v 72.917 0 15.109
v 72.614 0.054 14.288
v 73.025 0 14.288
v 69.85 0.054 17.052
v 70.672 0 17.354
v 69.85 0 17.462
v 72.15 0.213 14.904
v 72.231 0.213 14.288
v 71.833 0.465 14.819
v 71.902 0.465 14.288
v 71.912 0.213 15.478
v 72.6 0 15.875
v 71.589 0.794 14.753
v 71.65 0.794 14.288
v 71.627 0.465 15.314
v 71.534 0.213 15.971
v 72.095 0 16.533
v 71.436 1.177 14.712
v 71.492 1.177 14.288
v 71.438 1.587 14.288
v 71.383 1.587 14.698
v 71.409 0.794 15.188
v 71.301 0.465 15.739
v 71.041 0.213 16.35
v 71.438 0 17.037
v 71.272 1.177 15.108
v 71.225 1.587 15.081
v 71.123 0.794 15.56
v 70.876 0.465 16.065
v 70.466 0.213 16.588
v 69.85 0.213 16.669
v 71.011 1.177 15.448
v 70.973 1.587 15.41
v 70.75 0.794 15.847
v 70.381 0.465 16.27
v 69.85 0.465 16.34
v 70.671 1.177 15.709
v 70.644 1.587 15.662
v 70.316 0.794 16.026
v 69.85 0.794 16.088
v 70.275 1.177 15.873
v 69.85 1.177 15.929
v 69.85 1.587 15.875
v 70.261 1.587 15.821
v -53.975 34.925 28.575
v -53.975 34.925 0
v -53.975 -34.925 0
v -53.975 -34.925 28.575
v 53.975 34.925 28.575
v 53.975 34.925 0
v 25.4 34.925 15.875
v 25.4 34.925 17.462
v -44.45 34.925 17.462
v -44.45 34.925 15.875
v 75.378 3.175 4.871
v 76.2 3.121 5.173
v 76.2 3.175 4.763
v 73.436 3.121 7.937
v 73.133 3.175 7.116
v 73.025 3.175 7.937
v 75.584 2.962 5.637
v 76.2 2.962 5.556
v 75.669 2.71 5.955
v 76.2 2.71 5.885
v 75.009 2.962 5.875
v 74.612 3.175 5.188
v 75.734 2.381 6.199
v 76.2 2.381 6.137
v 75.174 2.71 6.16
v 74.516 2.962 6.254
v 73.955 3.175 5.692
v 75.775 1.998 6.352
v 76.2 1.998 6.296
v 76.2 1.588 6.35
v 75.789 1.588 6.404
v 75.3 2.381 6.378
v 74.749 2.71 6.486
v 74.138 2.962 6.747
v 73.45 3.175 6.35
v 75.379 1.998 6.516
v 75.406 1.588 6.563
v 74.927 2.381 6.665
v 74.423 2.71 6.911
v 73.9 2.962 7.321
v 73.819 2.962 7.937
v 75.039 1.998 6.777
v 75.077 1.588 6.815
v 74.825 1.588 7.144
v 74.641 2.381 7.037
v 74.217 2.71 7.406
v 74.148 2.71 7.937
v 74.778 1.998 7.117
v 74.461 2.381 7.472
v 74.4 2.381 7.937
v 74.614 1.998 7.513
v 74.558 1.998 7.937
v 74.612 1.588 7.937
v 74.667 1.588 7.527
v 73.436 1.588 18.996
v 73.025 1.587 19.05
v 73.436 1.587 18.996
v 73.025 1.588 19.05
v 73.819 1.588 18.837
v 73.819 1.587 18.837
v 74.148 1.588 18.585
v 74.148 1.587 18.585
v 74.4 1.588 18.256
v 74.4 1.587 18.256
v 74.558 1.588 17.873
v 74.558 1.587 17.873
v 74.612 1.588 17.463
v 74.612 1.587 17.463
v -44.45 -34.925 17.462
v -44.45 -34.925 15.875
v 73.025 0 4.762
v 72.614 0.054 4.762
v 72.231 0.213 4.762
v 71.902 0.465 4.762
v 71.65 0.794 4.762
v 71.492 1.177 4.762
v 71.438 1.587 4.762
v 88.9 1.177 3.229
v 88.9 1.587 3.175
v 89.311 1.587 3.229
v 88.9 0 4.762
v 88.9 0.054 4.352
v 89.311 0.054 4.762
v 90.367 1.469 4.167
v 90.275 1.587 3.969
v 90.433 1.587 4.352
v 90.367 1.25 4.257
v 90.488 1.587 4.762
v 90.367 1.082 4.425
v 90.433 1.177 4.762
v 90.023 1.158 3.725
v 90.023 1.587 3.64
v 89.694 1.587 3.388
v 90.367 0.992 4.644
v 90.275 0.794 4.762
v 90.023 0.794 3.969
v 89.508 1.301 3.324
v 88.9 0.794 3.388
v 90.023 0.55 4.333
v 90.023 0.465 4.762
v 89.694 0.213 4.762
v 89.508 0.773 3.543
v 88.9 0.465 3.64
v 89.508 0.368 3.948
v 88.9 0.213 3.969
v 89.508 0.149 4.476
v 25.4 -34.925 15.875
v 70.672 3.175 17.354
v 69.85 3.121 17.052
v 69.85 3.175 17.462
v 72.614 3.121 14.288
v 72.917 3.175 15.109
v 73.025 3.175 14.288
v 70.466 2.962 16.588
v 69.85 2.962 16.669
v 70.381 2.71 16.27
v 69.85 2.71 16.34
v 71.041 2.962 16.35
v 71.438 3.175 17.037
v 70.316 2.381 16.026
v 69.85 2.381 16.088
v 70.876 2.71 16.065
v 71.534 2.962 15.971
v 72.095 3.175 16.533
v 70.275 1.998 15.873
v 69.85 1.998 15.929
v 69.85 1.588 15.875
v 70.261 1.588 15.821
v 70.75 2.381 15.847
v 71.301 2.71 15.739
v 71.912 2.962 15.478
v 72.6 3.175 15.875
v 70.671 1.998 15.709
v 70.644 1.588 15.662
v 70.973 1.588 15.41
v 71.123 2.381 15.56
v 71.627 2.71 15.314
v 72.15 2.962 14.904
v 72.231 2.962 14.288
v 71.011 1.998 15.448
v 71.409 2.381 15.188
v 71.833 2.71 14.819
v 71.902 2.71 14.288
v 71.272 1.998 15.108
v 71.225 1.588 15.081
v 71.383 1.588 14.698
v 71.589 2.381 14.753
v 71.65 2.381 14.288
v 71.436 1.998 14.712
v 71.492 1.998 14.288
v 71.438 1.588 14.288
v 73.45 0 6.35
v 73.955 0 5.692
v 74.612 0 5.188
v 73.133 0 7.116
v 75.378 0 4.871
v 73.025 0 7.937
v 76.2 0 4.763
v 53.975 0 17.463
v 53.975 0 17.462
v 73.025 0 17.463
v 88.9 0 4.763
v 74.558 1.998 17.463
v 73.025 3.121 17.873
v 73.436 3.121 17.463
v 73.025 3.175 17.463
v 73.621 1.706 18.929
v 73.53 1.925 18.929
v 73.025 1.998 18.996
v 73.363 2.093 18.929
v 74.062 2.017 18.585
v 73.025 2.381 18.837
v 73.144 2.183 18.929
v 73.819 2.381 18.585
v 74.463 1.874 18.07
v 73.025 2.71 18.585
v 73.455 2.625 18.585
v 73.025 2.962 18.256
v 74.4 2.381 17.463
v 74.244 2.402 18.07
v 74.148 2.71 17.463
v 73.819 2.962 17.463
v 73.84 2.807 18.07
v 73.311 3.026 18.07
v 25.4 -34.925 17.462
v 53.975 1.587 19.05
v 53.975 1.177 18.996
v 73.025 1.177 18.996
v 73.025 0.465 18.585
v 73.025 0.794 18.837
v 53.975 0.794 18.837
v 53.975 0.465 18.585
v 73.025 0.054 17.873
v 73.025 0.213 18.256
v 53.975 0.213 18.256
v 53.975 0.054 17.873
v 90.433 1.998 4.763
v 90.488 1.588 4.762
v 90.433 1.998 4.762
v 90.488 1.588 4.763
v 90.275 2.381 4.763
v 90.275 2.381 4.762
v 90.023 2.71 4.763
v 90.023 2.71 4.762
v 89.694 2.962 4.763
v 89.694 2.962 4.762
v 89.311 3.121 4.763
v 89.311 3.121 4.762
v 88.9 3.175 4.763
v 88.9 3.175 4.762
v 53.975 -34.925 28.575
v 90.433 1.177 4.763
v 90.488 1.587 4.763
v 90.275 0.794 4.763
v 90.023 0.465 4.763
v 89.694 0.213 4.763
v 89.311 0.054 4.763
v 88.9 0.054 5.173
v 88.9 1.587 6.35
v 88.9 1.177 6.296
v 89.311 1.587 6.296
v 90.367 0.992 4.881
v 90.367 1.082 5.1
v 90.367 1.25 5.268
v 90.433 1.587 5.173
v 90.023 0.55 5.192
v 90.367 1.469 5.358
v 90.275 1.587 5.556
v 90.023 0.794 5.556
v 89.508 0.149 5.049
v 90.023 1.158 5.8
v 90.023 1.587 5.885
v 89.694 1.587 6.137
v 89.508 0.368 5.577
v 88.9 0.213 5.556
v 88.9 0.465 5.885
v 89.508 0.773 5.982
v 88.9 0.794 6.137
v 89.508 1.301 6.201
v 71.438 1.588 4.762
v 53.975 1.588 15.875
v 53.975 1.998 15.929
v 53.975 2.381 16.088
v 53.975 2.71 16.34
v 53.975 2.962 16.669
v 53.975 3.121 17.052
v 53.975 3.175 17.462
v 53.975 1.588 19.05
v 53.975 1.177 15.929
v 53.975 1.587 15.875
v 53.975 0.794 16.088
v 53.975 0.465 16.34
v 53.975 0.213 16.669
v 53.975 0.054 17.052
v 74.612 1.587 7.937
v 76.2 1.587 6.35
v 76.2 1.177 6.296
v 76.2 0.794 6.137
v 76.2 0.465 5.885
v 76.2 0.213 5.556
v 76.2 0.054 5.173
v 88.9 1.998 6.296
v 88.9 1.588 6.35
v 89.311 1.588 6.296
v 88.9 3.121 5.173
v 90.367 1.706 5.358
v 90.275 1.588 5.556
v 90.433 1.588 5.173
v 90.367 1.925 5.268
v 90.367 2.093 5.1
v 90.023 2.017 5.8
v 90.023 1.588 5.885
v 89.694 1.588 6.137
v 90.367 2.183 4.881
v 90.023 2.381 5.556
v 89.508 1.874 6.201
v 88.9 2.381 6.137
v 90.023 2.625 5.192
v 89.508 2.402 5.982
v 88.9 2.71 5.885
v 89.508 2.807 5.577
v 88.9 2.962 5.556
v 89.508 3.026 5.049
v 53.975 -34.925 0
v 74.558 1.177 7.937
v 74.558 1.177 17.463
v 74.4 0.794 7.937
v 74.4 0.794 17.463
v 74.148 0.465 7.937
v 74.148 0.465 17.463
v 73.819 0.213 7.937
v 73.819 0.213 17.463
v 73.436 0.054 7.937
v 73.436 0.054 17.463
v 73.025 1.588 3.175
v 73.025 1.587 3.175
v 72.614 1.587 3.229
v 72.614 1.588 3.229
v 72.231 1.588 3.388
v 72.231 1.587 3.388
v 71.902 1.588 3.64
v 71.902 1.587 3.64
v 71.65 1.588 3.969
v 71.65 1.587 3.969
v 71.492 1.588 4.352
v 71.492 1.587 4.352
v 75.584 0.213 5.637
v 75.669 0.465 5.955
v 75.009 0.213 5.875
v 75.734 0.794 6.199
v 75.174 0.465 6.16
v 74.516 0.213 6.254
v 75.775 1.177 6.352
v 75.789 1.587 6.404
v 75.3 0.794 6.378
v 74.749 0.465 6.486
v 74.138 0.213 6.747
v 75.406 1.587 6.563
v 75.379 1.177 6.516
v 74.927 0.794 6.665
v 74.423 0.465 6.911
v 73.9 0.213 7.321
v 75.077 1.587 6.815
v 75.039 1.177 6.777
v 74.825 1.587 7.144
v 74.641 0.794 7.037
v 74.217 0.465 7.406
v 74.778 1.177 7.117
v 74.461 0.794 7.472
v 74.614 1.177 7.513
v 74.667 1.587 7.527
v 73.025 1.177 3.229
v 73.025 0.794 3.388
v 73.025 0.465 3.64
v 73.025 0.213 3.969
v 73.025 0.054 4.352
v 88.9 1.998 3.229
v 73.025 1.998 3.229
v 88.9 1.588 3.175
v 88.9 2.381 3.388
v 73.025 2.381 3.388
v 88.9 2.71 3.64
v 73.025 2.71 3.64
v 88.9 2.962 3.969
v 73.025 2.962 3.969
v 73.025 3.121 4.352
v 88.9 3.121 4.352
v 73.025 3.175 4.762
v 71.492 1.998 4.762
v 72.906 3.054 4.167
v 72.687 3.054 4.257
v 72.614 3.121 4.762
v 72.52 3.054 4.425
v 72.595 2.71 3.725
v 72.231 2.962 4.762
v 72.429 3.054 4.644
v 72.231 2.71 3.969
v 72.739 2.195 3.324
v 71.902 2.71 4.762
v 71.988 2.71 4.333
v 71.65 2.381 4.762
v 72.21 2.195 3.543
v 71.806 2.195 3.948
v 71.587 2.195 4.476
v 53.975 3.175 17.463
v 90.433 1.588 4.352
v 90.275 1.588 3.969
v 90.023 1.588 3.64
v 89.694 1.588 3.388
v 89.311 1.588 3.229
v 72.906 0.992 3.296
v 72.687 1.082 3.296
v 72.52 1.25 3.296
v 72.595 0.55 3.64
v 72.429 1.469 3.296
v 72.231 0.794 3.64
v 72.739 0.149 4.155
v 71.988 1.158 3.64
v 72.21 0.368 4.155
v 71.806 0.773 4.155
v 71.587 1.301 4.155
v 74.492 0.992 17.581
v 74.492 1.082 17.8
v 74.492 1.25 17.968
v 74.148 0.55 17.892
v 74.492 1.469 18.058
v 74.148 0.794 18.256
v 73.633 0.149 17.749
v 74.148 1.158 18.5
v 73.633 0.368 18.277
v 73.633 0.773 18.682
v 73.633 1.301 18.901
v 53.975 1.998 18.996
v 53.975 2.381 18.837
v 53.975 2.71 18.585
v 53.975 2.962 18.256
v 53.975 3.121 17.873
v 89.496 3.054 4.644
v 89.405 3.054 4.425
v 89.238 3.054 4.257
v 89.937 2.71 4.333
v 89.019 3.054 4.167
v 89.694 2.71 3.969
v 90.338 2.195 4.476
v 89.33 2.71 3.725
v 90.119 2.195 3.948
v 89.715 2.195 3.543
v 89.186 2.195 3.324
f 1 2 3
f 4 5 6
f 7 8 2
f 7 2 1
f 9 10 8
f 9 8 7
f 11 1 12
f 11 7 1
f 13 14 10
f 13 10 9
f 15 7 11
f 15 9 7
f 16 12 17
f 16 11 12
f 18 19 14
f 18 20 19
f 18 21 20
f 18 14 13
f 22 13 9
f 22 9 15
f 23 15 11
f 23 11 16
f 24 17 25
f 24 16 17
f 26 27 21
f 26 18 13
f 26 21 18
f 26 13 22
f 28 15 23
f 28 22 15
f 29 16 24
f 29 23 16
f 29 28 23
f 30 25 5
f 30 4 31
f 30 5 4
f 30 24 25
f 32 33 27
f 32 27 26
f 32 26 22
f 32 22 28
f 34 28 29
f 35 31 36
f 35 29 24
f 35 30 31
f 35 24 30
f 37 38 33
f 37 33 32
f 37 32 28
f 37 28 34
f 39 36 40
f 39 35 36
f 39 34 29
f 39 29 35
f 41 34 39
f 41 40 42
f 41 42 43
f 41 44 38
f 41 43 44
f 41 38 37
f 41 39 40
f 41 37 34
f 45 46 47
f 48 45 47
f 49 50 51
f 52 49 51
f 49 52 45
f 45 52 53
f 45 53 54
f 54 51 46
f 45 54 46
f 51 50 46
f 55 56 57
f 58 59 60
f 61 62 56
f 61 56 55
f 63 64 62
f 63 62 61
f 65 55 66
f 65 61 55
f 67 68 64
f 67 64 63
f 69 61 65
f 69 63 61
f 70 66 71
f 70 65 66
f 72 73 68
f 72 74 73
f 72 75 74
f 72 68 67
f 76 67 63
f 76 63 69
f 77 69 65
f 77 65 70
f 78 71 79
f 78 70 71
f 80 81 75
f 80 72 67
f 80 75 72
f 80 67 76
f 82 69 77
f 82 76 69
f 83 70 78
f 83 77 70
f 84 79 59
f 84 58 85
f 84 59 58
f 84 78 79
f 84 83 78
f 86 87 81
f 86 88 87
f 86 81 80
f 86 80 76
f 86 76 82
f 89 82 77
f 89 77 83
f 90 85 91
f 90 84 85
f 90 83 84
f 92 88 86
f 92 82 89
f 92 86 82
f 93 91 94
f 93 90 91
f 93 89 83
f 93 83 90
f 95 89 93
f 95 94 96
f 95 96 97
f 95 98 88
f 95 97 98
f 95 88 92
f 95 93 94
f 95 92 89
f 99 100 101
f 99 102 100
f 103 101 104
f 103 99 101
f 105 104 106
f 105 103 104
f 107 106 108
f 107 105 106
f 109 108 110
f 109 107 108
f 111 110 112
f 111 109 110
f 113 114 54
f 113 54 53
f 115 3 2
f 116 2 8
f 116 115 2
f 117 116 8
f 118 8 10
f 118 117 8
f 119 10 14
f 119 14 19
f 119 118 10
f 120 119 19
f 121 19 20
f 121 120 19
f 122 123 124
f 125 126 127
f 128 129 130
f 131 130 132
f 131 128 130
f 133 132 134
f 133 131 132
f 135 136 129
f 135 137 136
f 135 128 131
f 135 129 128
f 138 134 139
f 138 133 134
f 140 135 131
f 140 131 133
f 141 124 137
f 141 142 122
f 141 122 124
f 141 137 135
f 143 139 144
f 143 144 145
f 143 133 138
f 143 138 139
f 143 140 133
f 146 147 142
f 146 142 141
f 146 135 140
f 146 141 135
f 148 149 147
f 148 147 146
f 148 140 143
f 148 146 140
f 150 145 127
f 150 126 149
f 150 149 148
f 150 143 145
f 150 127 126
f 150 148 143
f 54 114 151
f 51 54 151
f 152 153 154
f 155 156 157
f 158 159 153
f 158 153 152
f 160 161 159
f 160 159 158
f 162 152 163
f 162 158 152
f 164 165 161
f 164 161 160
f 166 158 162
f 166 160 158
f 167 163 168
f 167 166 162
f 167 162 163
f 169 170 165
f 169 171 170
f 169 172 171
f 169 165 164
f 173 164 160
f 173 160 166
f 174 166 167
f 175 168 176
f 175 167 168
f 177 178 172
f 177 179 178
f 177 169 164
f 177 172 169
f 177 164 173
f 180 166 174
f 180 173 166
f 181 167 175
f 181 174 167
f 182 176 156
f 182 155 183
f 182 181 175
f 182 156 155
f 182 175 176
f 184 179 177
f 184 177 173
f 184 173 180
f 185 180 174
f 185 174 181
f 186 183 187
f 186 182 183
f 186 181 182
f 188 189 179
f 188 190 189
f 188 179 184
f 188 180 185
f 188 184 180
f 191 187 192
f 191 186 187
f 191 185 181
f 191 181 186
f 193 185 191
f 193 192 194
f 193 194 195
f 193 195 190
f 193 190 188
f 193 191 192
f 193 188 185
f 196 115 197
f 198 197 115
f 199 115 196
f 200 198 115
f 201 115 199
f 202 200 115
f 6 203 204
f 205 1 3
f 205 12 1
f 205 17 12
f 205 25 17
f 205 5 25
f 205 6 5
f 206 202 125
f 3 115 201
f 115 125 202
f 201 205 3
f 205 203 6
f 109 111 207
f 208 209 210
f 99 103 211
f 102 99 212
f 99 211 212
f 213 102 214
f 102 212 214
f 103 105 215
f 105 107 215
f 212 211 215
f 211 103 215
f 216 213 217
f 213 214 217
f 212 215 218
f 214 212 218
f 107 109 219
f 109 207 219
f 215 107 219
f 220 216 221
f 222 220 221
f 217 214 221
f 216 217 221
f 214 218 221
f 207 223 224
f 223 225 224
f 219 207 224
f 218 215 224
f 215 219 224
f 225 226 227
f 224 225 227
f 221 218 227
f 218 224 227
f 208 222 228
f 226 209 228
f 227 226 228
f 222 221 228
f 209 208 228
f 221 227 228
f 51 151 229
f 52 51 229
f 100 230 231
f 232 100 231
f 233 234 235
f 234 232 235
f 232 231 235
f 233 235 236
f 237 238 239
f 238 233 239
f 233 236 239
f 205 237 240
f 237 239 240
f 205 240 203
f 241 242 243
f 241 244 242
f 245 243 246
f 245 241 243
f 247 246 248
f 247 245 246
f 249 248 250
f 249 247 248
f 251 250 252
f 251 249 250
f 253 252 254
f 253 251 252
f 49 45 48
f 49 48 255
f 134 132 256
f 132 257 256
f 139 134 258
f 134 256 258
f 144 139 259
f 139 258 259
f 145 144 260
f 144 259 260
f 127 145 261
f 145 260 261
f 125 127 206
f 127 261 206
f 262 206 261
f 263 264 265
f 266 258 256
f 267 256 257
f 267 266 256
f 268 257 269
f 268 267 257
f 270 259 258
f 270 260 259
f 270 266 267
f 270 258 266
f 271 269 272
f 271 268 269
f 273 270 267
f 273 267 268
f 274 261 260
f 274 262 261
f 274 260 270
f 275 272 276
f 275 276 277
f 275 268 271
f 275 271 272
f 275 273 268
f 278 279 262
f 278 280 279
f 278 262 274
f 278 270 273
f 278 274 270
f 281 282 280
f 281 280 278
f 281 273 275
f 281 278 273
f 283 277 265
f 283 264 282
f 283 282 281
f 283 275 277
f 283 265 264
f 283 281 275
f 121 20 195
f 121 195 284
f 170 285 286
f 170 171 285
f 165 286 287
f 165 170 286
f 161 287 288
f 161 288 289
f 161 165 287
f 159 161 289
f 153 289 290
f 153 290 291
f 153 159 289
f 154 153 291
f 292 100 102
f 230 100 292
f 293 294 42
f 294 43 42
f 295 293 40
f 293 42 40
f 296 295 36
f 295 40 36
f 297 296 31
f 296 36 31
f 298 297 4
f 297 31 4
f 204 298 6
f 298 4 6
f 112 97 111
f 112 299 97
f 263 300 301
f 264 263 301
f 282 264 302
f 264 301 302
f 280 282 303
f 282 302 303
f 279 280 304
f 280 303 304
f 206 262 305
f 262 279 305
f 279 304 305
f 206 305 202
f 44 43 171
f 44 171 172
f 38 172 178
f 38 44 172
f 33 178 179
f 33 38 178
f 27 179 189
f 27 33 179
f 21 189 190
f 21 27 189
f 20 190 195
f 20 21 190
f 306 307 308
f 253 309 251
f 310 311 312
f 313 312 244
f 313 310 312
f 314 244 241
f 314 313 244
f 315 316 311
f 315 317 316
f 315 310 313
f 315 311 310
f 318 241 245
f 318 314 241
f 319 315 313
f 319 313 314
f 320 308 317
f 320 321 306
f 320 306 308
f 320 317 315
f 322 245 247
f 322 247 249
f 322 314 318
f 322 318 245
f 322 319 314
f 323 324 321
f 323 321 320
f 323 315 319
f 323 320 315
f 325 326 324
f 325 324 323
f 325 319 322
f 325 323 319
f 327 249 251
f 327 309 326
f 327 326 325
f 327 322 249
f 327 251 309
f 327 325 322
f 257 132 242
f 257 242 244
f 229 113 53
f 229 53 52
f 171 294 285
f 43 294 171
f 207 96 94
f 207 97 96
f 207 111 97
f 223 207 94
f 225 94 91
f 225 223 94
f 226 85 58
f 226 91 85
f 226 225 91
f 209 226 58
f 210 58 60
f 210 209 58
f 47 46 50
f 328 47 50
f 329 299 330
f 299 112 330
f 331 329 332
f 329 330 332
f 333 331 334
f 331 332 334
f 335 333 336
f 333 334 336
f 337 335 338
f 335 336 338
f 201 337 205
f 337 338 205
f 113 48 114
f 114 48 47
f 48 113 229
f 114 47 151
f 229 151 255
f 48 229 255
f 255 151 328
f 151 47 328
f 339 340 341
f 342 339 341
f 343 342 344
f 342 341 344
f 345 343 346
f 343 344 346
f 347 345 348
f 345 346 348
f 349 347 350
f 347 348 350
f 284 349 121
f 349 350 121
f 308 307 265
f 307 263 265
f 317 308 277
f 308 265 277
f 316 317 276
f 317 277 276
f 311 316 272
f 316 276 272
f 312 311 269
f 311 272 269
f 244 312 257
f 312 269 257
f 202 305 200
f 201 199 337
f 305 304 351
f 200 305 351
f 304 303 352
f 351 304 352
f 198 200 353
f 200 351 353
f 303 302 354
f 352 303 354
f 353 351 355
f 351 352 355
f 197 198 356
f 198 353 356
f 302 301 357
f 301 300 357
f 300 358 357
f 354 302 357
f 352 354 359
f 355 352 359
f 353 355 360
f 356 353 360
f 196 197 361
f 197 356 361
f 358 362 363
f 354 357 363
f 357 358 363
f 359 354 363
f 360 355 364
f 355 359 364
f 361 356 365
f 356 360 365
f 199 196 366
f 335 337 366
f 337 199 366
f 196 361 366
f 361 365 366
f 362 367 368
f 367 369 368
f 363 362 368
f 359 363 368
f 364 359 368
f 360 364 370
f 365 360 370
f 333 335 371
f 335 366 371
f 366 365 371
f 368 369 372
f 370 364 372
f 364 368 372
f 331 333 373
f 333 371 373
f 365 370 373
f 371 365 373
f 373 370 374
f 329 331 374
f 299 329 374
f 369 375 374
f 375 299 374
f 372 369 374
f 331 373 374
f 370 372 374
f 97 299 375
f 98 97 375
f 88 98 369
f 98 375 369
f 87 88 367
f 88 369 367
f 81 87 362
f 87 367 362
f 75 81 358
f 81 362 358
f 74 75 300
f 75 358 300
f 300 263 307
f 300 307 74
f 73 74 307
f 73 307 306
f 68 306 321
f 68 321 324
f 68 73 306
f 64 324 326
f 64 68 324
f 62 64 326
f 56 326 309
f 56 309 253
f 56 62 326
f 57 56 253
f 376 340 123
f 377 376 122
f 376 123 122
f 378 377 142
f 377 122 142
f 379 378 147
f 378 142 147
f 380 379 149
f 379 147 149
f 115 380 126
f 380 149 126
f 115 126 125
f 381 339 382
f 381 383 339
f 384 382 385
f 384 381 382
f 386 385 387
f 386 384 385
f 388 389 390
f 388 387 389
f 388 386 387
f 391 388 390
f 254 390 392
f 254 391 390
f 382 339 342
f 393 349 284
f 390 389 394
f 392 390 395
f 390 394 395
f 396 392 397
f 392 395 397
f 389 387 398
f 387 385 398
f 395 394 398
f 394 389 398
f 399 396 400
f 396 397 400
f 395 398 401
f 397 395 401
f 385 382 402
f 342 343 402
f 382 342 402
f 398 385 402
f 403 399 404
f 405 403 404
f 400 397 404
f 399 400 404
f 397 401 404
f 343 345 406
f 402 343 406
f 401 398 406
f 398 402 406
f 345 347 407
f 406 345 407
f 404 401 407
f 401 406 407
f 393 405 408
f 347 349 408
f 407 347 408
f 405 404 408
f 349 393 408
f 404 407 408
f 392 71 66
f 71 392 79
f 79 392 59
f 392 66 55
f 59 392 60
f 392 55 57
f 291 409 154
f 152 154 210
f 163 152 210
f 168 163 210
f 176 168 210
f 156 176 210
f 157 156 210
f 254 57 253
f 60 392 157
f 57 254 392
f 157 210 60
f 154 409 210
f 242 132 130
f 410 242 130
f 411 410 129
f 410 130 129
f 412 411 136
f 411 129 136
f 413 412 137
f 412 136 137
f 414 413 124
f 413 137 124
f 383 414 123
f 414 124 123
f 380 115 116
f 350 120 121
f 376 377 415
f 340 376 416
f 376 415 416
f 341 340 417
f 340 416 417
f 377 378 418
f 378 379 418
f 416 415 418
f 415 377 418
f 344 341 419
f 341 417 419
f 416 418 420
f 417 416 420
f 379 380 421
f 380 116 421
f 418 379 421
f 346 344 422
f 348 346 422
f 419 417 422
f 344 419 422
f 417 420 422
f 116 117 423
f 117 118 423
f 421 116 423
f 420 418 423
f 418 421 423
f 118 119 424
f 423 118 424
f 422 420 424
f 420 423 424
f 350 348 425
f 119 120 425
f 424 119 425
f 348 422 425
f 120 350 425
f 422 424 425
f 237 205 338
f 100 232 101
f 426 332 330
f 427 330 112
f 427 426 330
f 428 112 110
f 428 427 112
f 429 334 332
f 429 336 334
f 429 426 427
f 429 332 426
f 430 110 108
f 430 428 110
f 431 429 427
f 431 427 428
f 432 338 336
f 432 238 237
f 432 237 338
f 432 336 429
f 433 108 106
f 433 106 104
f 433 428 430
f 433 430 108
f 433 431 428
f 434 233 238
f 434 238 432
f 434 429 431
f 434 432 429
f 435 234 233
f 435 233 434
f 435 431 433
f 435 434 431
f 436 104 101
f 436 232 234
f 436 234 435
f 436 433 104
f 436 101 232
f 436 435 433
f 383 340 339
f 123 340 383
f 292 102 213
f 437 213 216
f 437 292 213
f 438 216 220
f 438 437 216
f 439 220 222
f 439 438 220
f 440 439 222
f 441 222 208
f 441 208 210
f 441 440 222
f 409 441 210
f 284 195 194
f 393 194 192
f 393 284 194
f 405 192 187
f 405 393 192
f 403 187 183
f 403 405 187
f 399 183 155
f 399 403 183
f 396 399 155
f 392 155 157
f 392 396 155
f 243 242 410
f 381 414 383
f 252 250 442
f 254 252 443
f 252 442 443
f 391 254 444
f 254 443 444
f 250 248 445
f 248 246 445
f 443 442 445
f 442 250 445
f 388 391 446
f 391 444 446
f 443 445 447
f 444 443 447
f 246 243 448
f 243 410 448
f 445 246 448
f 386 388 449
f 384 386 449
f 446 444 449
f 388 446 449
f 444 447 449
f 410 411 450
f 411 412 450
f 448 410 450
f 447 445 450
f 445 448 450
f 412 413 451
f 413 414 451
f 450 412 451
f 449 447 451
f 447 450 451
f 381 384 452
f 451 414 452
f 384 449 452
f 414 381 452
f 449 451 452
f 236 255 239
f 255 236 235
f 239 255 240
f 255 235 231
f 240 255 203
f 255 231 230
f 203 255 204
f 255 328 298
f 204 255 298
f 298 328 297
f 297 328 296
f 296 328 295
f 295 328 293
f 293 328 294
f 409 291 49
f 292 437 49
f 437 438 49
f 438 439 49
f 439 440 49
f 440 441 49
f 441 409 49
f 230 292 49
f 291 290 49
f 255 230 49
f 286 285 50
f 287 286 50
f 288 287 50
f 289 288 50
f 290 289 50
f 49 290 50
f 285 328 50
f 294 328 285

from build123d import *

# Parameters (mm, degrees)
F1_DEPTH      = 28.575
F2_W          = 69.85
F2_H          = 1.5875
F3_DEPTH      = 69.85
F6_DEPTH      = 1.5875
F6_DEPTH_BACK = 1.5875
F7_R          = 1.58749


# Not quite as in the source:
# - a fillet or chamfer is up to 0.001 mm smaller than in the source, because OpenCascade refuses the exact size


with BuildPart() as f1:
    # F0 (on Top) → F1 (new body)
    with BuildSketch(Plane.XY):
        Polygon((53.975, -34.925), (53.975, 0), (53.975, 34.925), (-53.975, 34.925), (-53.975, -34.925), align=None)
    extrude(amount=F1_DEPTH)

    # F2 (on face) → F3 (cut, through all)
    with BuildSketch(Plane.XZ.offset(34.925)):
        with Locations((-9.525, 16.66875)):
            Rectangle(F2_W, F2_H)
    extrude(amount=-F3_DEPTH, mode=Mode.SUBTRACT)

    # F5 (on offset) → F6 (join, two sides)
    with BuildSketch(Plane.XZ.offset(-1.5875)) as f6_sk:
        Polygon((53.975, 19.05), (53.975, 15.875), (71.4375, 15.875), (71.4375, 3.175), (90.4875, 3.175), (90.4875, 6.35), (74.6125, 6.35), (74.6125, 19.05), align=None)
    extrude(amount=F6_DEPTH)
    extrude(f6_sk.sketch, amount=-F6_DEPTH_BACK)

    # F7 (radius 1.5875 in the source; OpenCascade refuses exactly that, so slightly less here)
    f7_edges = [f1.edges().sort_by_distance(p)[0] for p in [
        (64.29375, 0, 19.05),
        (74.6125, 3.175, 12.7),
        (74.6125, 0, 12.7),
        (74.6125, 1.5875, 19.05),
        (74.6125, 1.5875, 6.35),
        (71.4375, 0, 9.525),
        (62.70625, 0, 15.875),
        (64.29375, 3.175, 19.05),
        (82.55, 3.175, 6.35),
        (82.55, 0, 6.35),
        (80.9625, 0, 3.175),
        (90.4875, 1.5875, 3.175),
        (90.4875, 0, 4.7625),
        (90.4875, 1.5875, 6.35),
        (90.4875, 3.175, 4.7625),
        (62.70625, 3.175, 15.875),
        (71.4375, 1.5875, 3.175),
        (80.9625, 3.175, 3.175),
        (71.4375, 3.175, 9.525),
        (71.4375, 1.5875, 15.875),
    ]]
    fillet(f7_edges, radius=F7_R)


solid = f1.part
